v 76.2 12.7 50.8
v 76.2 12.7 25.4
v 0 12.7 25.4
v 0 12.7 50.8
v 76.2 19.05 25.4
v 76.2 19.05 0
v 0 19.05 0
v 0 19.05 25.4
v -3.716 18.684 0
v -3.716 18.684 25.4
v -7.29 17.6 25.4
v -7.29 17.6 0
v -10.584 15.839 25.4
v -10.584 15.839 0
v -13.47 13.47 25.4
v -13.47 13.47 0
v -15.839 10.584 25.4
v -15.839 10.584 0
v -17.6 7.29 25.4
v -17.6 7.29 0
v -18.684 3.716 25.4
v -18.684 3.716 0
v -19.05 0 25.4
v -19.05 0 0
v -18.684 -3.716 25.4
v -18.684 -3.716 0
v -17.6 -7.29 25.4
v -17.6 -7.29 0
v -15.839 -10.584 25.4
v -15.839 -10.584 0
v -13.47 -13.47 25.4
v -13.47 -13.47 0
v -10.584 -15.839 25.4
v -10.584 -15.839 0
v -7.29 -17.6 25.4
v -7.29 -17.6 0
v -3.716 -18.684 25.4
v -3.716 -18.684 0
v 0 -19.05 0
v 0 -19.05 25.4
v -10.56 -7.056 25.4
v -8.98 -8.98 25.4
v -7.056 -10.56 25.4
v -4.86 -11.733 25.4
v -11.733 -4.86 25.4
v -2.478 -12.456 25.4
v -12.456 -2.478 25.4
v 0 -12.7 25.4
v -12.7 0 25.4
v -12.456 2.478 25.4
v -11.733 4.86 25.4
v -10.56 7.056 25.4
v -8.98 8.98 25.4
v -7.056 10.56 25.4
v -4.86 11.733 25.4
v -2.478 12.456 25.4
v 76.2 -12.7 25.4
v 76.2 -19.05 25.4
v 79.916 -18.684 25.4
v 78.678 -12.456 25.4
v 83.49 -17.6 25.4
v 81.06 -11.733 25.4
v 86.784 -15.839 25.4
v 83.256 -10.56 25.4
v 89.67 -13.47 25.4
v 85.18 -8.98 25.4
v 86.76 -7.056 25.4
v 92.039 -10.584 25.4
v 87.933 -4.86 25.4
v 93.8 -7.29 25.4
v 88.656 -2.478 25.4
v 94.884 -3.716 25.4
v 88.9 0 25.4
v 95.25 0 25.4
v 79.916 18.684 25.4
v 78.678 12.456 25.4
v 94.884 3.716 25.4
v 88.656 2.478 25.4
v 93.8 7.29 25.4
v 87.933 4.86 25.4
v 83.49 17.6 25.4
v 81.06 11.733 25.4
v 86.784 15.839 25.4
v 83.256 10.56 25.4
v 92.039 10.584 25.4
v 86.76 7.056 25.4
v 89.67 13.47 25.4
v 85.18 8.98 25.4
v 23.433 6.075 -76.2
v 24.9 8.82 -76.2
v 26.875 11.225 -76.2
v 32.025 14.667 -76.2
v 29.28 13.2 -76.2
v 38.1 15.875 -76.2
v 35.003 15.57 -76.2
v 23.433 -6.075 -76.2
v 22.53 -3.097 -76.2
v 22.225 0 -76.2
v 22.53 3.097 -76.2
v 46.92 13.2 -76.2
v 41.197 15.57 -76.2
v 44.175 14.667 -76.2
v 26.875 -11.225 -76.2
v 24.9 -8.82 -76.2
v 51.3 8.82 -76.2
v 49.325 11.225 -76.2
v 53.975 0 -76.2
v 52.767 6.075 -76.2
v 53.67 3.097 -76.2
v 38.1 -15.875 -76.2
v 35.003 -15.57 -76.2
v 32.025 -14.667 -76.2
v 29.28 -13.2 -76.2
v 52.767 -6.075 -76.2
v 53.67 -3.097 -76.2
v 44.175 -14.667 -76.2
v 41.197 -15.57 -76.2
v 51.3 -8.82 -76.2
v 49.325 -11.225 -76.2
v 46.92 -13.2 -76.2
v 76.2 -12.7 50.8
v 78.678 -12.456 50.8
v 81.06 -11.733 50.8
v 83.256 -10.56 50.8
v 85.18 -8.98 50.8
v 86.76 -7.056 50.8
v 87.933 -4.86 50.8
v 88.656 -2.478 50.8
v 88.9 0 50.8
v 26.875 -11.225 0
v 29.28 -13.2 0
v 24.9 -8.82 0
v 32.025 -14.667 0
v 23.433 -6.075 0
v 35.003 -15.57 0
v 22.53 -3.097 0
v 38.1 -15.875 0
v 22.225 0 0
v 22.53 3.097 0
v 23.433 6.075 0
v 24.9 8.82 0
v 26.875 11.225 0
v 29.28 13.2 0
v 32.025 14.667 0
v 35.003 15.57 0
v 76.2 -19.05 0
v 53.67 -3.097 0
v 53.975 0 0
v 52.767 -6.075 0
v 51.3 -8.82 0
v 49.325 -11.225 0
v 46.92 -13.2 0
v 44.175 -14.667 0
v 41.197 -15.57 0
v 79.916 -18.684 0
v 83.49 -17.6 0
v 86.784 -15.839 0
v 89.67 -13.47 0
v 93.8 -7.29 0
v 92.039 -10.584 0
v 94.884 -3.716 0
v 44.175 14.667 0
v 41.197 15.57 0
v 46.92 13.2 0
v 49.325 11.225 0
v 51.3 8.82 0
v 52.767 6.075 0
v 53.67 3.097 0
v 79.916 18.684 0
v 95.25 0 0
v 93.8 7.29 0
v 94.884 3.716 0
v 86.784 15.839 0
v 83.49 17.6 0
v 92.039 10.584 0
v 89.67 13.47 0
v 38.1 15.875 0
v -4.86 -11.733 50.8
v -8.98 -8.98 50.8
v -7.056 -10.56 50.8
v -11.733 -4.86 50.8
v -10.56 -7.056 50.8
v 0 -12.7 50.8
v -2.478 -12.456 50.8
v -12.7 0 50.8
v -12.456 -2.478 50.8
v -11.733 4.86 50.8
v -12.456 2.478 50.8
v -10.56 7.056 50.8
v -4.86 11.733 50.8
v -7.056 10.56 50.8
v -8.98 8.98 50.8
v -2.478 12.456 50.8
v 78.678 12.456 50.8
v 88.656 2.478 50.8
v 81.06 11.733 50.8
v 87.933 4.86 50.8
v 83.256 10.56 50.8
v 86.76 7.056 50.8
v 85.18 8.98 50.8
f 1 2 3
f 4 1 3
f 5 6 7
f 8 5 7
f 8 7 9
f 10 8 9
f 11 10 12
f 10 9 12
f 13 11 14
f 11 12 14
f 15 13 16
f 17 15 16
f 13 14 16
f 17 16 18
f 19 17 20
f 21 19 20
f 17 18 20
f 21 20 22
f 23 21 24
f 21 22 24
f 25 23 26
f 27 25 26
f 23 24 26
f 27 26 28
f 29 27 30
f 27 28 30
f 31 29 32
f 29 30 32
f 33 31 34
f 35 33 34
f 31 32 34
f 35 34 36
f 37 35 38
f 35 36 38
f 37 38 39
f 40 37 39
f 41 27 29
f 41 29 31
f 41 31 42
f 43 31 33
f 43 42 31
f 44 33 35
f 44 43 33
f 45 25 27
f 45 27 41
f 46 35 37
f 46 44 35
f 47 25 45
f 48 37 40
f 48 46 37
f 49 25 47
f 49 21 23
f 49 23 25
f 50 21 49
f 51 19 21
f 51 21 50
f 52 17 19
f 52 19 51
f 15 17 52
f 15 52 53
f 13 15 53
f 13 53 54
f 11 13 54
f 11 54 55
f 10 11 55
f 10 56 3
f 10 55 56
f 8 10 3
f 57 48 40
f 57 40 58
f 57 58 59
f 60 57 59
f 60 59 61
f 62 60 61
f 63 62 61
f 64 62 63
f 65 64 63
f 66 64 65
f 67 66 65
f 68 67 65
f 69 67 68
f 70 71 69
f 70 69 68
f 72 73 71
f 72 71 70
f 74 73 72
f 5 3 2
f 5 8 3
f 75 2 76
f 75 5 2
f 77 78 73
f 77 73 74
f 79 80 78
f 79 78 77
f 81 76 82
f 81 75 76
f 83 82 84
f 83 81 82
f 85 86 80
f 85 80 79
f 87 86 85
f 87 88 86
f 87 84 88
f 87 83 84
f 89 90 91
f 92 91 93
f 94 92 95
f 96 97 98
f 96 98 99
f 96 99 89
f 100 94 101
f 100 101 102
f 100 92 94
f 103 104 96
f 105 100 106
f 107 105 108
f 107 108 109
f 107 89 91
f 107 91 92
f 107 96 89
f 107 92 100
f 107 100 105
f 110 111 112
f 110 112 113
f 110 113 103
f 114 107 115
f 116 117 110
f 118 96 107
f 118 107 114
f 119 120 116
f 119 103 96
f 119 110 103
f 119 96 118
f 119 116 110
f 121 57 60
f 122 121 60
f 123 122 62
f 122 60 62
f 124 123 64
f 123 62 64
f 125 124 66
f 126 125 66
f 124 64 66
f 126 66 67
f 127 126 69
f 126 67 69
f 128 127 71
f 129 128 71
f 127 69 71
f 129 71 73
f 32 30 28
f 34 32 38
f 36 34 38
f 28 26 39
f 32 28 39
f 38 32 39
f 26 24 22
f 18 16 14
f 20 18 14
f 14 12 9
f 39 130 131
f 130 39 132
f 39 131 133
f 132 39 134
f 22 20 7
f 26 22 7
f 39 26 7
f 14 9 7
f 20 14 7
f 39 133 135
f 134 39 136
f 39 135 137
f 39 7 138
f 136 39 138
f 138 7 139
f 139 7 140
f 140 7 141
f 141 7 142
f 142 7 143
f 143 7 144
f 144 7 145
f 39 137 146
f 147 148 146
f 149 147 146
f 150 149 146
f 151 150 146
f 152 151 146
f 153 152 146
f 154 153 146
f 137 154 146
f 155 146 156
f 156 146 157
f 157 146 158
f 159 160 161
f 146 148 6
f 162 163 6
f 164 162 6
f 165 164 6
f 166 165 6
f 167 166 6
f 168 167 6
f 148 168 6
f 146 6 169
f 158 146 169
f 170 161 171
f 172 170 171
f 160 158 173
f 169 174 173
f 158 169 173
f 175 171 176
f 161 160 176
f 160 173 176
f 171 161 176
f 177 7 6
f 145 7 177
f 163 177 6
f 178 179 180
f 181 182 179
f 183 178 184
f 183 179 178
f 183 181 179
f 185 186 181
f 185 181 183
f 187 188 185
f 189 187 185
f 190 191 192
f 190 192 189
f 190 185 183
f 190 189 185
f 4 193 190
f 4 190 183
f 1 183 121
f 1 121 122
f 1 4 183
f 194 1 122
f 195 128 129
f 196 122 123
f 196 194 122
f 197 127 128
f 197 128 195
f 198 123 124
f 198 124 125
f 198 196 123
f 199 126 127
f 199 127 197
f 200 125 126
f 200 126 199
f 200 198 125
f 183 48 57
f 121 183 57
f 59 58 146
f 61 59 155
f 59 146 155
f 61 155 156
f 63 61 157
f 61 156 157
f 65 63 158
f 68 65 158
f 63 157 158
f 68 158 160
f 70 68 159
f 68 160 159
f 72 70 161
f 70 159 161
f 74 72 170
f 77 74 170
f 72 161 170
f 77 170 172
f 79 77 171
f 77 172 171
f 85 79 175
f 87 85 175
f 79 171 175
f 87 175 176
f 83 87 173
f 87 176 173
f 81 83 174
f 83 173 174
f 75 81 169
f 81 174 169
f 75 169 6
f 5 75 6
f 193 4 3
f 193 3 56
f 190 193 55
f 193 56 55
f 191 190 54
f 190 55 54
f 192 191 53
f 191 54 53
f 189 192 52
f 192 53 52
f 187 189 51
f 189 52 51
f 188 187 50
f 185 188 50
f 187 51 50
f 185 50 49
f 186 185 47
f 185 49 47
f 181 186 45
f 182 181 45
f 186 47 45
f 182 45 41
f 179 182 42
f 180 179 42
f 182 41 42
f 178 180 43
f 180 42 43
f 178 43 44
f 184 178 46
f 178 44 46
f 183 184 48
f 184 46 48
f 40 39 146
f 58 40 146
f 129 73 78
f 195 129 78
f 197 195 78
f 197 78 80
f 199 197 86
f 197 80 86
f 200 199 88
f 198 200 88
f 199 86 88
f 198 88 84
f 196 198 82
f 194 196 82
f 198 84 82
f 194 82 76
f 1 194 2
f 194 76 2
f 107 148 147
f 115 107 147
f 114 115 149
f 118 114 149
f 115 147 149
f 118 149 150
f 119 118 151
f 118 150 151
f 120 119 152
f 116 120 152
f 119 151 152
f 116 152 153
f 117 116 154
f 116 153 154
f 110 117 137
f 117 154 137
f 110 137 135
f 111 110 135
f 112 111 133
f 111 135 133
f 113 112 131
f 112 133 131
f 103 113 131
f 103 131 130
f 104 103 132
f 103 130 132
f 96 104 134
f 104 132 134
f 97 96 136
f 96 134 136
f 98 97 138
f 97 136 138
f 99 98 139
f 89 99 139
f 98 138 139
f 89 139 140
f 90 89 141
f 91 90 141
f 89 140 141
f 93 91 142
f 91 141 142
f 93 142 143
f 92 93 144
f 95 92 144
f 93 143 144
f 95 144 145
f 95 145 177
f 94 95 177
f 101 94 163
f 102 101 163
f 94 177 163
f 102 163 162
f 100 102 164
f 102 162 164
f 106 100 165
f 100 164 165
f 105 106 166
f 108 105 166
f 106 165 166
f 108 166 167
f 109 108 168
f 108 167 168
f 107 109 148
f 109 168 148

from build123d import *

# Parameters (mm, degrees)
F1_DEPTH = 25.4
F3_DEPTH = 25.4
F4_R     = 15.875
F5_DEPTH = 76.2


with BuildPart() as f1:
    # F0 (on Top) → F1 (new body)
    with BuildSketch(Plane.XY):
        with BuildLine():
            Line((76.2, 19.05), (0, 19.05))
            ThreePointArc((0, 19.05), (-19.05, 0), (0, -19.05))
            Line((0, -19.05), (76.2, -19.05))
            ThreePointArc((76.2, -19.05), (95.25, 0), (76.2, 19.05))
        make_face()
    extrude(amount=F1_DEPTH)

    # F2 (on face) → F3 (join)
    with BuildSketch(Plane.XY.offset(25.4)):
        with BuildLine():
            Line((76.2, 12.7), (0, 12.7))
            ThreePointArc((0, 12.7), (-12.7, 0), (0, -12.7))
            Line((0, -12.7), (76.2, -12.7))
            ThreePointArc((76.2, -12.7), (63.5, 0), (76.2, 12.7))
        make_face()
        with BuildLine():
            ThreePointArc((88.9, 0), (85.180256, 8.980256), (76.2, 12.7))
            ThreePointArc((76.2, 12.7), (63.5, 0), (76.2, -12.7))
            ThreePointArc((76.2, -12.7), (85.180256, -8.980256), (88.9, 0))
        make_face()
    extrude(amount=F3_DEPTH)

    # F4 (on face) → F5 (join)
    with BuildSketch(Plane(origin=(0, 0, 0), x_dir=(1, 0, 0), z_dir=(0, 0, -1))):
        with Locations((38.1, 0)):
            Circle(F4_R)
    extrude(amount=F5_DEPTH)


solid = f1.part
